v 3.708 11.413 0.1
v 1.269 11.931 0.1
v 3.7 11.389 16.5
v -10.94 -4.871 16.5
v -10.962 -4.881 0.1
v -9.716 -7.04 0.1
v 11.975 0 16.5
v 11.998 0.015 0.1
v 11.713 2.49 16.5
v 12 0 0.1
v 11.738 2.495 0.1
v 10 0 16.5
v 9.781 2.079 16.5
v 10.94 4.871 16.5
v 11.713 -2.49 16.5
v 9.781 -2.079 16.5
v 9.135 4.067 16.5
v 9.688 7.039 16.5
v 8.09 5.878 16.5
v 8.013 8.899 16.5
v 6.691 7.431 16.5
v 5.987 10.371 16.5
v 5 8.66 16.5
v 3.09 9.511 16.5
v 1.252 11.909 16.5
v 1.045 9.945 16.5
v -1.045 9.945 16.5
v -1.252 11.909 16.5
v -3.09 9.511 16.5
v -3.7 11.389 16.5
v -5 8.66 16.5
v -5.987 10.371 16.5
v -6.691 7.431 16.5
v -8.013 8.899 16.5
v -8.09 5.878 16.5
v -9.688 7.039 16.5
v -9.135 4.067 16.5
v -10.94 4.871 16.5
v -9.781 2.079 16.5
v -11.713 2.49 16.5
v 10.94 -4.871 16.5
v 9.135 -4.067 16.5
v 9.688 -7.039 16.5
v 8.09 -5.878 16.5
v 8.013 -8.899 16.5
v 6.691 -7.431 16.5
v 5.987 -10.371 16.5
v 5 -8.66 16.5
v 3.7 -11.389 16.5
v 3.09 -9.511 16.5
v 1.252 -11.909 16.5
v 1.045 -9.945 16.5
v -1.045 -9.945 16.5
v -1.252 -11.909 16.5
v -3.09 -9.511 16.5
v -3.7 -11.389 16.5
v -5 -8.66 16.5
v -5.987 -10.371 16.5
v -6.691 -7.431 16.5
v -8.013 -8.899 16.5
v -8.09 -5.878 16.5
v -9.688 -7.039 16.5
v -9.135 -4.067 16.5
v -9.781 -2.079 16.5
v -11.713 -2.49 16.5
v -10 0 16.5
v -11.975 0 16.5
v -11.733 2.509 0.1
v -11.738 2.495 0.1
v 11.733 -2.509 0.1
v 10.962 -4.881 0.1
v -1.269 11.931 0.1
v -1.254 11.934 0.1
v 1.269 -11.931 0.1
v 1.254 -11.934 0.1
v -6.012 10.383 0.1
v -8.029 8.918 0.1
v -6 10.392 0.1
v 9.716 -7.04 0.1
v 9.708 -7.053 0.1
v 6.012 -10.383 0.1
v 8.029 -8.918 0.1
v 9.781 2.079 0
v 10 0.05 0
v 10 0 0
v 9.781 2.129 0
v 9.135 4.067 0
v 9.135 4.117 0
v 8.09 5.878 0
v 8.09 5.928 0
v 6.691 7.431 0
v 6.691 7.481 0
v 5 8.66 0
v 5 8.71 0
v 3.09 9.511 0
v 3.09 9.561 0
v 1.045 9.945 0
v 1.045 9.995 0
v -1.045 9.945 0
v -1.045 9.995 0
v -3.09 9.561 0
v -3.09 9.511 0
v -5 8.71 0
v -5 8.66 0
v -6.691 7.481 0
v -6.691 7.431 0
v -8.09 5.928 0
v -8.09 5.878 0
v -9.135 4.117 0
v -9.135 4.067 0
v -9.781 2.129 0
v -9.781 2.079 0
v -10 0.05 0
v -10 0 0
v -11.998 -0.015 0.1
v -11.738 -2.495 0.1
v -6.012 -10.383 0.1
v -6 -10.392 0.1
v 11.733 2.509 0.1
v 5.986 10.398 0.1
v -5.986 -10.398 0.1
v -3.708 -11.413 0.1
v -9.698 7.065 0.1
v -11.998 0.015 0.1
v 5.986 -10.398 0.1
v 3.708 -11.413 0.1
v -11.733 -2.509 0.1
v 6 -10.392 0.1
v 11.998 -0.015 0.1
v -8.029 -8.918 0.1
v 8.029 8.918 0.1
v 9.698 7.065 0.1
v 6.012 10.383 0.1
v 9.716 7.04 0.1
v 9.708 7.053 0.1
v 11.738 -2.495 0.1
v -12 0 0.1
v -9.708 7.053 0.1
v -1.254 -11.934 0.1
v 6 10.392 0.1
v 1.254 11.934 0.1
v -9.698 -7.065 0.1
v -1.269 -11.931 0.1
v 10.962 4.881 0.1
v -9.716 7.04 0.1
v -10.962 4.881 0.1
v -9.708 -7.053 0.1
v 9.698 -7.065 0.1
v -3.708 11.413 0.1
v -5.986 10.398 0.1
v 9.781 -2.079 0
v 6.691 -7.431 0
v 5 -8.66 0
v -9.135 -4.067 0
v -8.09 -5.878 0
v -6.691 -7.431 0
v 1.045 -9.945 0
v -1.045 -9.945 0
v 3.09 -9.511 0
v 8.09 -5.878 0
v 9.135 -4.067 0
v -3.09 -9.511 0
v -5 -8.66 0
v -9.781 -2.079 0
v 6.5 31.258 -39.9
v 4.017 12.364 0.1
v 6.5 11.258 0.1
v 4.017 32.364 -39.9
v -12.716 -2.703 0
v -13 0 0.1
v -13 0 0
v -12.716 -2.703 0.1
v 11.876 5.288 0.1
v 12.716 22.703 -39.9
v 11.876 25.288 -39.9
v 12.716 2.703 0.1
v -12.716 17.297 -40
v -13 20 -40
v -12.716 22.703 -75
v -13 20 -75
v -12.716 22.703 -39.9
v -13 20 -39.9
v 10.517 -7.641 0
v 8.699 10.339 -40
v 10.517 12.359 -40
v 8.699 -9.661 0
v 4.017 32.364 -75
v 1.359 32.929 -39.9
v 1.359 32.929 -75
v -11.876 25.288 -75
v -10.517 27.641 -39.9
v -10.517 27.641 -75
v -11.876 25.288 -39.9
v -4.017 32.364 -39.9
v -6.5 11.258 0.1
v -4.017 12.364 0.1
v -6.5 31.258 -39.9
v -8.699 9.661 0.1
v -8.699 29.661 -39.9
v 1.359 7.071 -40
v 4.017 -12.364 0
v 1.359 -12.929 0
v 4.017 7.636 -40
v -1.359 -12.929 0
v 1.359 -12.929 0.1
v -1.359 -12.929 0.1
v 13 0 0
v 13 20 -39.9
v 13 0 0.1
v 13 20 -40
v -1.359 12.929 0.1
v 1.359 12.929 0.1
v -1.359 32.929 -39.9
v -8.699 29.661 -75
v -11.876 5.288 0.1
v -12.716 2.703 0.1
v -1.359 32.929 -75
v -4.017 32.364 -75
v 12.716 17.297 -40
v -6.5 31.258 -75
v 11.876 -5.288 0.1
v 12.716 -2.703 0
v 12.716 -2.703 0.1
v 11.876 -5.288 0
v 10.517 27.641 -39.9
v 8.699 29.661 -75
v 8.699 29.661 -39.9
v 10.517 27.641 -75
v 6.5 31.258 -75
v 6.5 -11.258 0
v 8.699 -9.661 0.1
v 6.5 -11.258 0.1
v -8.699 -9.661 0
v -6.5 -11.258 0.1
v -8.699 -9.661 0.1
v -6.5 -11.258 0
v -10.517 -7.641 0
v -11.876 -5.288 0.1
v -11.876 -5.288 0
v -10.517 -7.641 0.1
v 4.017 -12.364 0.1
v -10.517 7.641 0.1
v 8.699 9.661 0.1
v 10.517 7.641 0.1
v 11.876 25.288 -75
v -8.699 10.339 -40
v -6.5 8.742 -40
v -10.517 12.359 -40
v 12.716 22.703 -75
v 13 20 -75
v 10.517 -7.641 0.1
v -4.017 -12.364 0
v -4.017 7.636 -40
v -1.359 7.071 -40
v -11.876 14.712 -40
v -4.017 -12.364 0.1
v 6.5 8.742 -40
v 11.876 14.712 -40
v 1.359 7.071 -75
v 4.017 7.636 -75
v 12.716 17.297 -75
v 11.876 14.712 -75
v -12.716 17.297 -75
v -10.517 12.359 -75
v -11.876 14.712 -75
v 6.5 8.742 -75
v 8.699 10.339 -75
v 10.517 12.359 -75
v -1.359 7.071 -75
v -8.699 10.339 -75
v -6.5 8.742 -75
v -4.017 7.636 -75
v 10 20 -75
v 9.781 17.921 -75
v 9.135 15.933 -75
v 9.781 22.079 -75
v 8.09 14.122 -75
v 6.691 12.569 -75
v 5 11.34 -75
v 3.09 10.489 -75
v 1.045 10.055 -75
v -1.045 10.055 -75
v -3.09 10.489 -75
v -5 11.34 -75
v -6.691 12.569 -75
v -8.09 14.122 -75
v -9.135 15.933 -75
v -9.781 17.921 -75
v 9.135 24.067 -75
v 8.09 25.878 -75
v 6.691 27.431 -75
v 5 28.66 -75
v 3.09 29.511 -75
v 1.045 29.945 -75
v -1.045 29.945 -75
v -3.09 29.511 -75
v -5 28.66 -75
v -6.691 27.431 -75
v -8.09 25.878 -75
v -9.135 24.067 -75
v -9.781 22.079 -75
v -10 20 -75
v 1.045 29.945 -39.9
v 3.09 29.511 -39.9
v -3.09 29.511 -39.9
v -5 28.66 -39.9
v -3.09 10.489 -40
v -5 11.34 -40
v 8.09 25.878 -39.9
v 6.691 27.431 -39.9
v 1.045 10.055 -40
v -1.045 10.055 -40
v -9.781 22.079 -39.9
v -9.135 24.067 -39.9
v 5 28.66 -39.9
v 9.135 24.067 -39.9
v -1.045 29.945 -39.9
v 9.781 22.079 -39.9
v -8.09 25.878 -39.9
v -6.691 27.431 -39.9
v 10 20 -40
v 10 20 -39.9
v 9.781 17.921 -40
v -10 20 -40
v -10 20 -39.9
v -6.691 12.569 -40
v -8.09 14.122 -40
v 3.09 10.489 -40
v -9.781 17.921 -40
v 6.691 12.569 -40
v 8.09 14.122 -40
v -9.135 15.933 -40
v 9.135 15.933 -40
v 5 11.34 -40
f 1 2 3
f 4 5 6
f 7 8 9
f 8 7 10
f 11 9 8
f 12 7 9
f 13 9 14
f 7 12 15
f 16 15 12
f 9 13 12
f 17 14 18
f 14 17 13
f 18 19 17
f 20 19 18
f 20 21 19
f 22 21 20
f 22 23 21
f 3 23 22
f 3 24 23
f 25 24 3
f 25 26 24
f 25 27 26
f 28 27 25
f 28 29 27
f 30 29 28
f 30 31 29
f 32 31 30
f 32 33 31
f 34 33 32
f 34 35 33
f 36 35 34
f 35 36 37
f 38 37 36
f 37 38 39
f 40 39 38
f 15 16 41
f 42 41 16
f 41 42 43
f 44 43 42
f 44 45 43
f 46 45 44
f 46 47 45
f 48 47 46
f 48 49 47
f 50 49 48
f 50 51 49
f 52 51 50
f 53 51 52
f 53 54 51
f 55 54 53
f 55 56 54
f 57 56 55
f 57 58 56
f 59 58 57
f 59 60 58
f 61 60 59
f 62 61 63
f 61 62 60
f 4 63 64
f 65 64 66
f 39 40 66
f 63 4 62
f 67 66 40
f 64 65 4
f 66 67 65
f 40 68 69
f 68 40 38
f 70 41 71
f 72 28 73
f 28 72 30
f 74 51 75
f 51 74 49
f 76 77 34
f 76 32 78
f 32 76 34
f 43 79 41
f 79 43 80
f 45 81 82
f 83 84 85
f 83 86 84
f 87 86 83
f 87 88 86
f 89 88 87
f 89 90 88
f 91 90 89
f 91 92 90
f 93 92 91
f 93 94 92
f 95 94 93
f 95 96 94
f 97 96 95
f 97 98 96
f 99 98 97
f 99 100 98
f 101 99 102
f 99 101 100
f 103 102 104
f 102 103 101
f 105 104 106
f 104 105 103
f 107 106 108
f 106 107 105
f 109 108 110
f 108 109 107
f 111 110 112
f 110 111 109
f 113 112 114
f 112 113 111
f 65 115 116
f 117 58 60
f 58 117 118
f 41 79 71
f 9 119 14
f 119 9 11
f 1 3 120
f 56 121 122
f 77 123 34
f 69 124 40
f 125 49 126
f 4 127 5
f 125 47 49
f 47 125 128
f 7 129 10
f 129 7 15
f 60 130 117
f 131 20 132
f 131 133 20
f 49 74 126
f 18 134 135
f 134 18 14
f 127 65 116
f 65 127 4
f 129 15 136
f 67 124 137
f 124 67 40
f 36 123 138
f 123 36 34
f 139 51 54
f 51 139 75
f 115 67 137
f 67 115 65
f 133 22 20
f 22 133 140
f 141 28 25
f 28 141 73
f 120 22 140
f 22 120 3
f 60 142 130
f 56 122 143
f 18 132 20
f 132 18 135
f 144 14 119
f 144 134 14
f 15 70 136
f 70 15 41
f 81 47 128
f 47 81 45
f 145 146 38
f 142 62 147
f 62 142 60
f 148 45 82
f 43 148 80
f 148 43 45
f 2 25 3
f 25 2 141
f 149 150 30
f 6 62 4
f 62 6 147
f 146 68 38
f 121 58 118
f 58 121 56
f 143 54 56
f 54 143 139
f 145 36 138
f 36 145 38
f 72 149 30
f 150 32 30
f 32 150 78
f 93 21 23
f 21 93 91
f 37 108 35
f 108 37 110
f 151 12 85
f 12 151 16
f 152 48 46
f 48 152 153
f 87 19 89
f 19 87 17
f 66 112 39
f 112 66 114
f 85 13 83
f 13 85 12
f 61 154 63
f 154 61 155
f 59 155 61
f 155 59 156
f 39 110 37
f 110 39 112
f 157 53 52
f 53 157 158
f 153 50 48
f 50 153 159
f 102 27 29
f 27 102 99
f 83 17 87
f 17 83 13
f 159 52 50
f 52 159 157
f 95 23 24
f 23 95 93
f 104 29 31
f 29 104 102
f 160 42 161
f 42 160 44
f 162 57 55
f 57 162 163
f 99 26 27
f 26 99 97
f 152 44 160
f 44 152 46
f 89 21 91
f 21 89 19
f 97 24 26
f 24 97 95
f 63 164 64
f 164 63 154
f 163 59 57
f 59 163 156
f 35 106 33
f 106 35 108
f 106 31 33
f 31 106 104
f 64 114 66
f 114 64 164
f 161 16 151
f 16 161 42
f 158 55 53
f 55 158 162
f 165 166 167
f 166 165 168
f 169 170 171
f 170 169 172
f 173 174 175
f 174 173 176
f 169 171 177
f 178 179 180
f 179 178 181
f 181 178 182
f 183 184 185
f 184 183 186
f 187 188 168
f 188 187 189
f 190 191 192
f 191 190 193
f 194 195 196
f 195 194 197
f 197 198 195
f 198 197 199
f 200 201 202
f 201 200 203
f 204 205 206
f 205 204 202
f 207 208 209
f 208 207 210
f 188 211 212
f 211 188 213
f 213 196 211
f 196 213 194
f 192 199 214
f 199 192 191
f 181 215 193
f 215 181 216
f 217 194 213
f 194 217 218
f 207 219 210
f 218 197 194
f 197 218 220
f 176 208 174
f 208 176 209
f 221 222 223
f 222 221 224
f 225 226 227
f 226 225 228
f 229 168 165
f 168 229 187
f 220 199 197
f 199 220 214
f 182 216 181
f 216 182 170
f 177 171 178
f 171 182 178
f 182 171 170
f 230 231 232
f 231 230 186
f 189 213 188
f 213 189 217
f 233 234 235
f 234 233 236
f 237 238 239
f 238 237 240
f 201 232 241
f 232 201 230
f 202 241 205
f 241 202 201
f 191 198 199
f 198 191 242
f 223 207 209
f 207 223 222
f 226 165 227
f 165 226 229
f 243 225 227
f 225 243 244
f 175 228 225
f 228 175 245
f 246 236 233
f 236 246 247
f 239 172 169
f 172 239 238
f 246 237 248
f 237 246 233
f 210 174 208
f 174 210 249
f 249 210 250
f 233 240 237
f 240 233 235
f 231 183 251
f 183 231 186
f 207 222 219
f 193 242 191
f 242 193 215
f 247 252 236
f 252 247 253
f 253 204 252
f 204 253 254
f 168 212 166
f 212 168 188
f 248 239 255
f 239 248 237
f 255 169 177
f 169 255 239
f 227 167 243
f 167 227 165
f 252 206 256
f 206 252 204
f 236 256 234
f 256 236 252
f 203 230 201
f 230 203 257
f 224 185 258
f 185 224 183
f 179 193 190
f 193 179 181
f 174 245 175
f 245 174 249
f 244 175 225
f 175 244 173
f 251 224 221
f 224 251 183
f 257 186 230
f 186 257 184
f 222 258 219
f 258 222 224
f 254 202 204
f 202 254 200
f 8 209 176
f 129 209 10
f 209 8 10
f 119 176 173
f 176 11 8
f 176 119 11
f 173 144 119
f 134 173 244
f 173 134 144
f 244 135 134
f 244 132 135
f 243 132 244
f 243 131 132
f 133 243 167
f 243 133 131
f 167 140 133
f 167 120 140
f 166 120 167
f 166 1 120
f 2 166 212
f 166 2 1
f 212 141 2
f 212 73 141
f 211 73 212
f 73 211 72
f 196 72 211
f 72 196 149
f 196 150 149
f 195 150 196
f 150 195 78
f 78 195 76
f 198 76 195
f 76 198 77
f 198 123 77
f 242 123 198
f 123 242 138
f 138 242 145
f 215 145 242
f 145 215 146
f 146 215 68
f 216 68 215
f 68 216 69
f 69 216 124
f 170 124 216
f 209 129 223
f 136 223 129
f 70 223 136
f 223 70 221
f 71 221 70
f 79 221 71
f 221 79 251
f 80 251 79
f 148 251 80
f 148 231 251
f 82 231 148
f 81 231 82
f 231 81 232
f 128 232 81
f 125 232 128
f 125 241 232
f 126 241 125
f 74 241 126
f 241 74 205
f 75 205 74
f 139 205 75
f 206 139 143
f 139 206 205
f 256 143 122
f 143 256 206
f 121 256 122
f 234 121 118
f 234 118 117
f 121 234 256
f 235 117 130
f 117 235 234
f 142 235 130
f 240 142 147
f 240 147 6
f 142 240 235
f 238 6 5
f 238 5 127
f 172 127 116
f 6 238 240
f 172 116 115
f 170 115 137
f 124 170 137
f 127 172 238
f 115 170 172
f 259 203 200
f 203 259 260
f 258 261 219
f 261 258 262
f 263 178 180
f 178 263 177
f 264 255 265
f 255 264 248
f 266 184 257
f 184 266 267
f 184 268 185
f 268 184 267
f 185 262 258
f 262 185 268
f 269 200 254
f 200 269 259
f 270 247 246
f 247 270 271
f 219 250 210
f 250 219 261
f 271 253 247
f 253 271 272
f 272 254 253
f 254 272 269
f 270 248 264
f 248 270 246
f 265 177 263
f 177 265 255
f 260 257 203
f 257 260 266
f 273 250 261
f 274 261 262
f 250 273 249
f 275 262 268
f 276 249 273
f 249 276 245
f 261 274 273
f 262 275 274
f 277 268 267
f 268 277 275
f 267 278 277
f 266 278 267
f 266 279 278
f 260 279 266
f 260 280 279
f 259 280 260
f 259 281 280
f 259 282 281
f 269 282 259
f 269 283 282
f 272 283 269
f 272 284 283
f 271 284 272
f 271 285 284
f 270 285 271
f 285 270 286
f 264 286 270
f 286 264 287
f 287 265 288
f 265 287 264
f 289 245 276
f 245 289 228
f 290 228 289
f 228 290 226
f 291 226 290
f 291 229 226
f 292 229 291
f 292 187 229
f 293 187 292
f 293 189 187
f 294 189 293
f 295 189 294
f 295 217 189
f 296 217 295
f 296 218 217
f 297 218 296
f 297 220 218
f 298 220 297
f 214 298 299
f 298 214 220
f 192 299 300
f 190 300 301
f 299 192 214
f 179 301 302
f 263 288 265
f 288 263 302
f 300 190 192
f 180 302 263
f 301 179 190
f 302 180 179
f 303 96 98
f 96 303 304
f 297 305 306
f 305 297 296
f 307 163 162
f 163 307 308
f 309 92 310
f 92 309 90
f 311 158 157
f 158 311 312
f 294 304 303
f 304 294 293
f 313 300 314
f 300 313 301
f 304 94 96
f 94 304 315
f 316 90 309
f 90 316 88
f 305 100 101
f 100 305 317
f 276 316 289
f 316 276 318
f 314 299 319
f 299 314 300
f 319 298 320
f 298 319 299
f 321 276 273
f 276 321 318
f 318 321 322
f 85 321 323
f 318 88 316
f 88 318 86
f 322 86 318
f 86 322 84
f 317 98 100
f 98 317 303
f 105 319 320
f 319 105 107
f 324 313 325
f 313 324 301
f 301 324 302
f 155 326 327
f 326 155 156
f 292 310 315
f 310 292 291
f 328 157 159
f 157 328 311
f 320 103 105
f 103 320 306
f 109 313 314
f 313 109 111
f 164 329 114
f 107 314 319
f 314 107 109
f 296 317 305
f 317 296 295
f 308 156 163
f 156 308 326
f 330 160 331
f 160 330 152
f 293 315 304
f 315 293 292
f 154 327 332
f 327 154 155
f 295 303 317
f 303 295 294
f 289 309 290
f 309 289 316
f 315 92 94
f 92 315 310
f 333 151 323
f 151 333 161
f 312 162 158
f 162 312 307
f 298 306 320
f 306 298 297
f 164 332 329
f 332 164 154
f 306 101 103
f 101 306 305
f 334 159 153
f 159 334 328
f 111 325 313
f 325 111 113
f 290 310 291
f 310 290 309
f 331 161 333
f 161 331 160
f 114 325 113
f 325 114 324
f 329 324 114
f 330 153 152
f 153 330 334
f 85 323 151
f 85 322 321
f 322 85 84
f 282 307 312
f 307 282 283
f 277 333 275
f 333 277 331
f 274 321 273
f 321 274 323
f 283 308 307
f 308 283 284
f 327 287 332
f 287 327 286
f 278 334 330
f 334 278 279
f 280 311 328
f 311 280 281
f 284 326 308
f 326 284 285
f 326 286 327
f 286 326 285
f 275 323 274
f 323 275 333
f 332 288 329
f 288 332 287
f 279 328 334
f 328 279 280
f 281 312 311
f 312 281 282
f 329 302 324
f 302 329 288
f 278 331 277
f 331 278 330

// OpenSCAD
//drain(length=75, offset=0,offset_length=0); // strait 
drain(length=75, offset=20,offset_length=40); // side
module drain(length=75, offset=20,offset_length=40,d=24){
  coupler(d=d);
  translate([0,0,-length]) difference(){
    tube(length,offset,offset_length,d=d+2);
    tube(length,offset,offset_length,d=d-4);
  }
}

module coupler(d=23.8){
  difference(){
    cylinder(d1=d, d2=d-0.05, h=16.5);
    translate([0,0,-0.2]) cylinder(d=d-4, h=17);
  }
}

module tube(length=100, offset=20, offset_length=20, d=23.8){
  hull(){
    translate([0,0,length]) cylinder(d=d,h=0.1);
    translate([0,offset,length-offset_length]) cylinder(d=d,h=0.1); 
  }
  hull(){
    translate([0,offset,length-offset_length]) cylinder(d=d,h=0.1);
    translate([0,offset,0]) cylinder(d=d,h=0.1); 
  }
}
